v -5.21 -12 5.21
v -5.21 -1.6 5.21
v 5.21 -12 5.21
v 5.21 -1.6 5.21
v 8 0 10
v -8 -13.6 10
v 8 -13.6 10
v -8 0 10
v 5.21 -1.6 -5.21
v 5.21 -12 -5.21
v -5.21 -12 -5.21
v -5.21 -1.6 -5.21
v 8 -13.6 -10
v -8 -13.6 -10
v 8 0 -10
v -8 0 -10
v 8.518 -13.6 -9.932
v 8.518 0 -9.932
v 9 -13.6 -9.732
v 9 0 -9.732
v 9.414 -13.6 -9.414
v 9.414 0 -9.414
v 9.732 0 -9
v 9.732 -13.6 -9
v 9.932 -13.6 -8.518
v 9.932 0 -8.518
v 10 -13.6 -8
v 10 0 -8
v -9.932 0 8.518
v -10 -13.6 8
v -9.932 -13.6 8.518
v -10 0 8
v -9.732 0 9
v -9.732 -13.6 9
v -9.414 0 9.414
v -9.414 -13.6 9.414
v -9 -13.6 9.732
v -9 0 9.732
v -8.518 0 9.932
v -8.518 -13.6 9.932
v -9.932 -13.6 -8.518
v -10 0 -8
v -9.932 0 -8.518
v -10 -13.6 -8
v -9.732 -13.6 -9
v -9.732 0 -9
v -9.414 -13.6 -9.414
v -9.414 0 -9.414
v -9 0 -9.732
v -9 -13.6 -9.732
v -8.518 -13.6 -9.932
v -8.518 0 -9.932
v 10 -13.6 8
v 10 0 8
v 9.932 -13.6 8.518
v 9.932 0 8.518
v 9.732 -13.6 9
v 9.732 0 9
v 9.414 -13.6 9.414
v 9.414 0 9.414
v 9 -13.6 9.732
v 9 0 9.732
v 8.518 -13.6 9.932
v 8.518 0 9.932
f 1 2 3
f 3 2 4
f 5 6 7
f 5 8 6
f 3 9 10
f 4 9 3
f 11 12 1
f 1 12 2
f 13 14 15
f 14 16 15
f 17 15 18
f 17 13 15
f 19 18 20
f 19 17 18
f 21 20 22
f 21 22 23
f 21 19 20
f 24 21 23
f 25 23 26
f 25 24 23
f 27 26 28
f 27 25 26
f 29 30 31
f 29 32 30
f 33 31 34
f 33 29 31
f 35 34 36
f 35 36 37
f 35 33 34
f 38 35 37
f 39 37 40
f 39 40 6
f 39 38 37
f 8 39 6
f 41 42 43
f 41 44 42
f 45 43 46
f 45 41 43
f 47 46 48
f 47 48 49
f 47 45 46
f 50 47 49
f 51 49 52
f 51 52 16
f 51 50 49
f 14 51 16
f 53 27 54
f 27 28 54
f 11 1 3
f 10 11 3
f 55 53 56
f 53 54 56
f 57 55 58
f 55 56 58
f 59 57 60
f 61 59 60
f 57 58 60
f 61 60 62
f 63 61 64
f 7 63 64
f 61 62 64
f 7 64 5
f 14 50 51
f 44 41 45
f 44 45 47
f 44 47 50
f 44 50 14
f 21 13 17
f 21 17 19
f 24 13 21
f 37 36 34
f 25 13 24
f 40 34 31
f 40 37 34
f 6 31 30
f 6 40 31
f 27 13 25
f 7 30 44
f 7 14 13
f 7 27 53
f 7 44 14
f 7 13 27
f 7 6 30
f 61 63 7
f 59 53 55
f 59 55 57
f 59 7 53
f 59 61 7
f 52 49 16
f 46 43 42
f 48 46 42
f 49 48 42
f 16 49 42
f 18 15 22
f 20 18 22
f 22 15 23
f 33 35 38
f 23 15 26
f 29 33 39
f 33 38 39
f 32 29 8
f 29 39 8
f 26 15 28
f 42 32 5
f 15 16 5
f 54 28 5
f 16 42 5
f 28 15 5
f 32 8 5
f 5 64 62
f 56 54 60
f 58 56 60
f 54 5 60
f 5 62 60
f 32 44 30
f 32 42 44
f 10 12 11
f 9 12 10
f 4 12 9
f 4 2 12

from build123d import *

# Parameters (mm, degrees)
F0_W     = 20
F0_H     = 20
F0_W_2   = 10.42
F0_H_2   = 10.42
F1_DEPTH = 1.6
F2_DEPTH = 12
F3_W     = 20
F3_H     = 20
F3_W_2   = 10.42
F3_H_2   = 10.42
F4_DEPTH = 1.6
F5_R     = 2


with BuildPart() as f1:
    # F0 (on Front) → F1 (new body)
    with BuildSketch(Plane.XZ):
        Rectangle(F0_W, F0_H)
        Rectangle(F0_W_2, F0_H_2, mode=Mode.SUBTRACT)
        Rectangle(F0_W_2, F0_H_2)
    extrude(amount=F1_DEPTH)

    # F0 (on Front) → F2 (join)
    with BuildSketch(Plane.XZ):
        Rectangle(F0_W, F0_H)
        Rectangle(F0_W_2, F0_H_2, mode=Mode.SUBTRACT)
    extrude(amount=F2_DEPTH)

    # F3 (on face) → F4 (join)
    with BuildSketch(Plane.XZ.offset(12)):
        Rectangle(F3_W, F3_H)
        Rectangle(F3_W_2, F3_H_2, mode=Mode.SUBTRACT)
        Rectangle(F3_W_2, F3_H_2)
    extrude(amount=F4_DEPTH)

    # F5
    f5_edges = [f1.edges().sort_by_distance(p)[0] for p in [
        (-10, -6.8, -10),
        (10, -6.8, -10),
        (10, -6.8, 10),
        (-10, -6.8, 10),
    ]]
    fillet(f5_edges, radius=F5_R)


solid = f1.part
